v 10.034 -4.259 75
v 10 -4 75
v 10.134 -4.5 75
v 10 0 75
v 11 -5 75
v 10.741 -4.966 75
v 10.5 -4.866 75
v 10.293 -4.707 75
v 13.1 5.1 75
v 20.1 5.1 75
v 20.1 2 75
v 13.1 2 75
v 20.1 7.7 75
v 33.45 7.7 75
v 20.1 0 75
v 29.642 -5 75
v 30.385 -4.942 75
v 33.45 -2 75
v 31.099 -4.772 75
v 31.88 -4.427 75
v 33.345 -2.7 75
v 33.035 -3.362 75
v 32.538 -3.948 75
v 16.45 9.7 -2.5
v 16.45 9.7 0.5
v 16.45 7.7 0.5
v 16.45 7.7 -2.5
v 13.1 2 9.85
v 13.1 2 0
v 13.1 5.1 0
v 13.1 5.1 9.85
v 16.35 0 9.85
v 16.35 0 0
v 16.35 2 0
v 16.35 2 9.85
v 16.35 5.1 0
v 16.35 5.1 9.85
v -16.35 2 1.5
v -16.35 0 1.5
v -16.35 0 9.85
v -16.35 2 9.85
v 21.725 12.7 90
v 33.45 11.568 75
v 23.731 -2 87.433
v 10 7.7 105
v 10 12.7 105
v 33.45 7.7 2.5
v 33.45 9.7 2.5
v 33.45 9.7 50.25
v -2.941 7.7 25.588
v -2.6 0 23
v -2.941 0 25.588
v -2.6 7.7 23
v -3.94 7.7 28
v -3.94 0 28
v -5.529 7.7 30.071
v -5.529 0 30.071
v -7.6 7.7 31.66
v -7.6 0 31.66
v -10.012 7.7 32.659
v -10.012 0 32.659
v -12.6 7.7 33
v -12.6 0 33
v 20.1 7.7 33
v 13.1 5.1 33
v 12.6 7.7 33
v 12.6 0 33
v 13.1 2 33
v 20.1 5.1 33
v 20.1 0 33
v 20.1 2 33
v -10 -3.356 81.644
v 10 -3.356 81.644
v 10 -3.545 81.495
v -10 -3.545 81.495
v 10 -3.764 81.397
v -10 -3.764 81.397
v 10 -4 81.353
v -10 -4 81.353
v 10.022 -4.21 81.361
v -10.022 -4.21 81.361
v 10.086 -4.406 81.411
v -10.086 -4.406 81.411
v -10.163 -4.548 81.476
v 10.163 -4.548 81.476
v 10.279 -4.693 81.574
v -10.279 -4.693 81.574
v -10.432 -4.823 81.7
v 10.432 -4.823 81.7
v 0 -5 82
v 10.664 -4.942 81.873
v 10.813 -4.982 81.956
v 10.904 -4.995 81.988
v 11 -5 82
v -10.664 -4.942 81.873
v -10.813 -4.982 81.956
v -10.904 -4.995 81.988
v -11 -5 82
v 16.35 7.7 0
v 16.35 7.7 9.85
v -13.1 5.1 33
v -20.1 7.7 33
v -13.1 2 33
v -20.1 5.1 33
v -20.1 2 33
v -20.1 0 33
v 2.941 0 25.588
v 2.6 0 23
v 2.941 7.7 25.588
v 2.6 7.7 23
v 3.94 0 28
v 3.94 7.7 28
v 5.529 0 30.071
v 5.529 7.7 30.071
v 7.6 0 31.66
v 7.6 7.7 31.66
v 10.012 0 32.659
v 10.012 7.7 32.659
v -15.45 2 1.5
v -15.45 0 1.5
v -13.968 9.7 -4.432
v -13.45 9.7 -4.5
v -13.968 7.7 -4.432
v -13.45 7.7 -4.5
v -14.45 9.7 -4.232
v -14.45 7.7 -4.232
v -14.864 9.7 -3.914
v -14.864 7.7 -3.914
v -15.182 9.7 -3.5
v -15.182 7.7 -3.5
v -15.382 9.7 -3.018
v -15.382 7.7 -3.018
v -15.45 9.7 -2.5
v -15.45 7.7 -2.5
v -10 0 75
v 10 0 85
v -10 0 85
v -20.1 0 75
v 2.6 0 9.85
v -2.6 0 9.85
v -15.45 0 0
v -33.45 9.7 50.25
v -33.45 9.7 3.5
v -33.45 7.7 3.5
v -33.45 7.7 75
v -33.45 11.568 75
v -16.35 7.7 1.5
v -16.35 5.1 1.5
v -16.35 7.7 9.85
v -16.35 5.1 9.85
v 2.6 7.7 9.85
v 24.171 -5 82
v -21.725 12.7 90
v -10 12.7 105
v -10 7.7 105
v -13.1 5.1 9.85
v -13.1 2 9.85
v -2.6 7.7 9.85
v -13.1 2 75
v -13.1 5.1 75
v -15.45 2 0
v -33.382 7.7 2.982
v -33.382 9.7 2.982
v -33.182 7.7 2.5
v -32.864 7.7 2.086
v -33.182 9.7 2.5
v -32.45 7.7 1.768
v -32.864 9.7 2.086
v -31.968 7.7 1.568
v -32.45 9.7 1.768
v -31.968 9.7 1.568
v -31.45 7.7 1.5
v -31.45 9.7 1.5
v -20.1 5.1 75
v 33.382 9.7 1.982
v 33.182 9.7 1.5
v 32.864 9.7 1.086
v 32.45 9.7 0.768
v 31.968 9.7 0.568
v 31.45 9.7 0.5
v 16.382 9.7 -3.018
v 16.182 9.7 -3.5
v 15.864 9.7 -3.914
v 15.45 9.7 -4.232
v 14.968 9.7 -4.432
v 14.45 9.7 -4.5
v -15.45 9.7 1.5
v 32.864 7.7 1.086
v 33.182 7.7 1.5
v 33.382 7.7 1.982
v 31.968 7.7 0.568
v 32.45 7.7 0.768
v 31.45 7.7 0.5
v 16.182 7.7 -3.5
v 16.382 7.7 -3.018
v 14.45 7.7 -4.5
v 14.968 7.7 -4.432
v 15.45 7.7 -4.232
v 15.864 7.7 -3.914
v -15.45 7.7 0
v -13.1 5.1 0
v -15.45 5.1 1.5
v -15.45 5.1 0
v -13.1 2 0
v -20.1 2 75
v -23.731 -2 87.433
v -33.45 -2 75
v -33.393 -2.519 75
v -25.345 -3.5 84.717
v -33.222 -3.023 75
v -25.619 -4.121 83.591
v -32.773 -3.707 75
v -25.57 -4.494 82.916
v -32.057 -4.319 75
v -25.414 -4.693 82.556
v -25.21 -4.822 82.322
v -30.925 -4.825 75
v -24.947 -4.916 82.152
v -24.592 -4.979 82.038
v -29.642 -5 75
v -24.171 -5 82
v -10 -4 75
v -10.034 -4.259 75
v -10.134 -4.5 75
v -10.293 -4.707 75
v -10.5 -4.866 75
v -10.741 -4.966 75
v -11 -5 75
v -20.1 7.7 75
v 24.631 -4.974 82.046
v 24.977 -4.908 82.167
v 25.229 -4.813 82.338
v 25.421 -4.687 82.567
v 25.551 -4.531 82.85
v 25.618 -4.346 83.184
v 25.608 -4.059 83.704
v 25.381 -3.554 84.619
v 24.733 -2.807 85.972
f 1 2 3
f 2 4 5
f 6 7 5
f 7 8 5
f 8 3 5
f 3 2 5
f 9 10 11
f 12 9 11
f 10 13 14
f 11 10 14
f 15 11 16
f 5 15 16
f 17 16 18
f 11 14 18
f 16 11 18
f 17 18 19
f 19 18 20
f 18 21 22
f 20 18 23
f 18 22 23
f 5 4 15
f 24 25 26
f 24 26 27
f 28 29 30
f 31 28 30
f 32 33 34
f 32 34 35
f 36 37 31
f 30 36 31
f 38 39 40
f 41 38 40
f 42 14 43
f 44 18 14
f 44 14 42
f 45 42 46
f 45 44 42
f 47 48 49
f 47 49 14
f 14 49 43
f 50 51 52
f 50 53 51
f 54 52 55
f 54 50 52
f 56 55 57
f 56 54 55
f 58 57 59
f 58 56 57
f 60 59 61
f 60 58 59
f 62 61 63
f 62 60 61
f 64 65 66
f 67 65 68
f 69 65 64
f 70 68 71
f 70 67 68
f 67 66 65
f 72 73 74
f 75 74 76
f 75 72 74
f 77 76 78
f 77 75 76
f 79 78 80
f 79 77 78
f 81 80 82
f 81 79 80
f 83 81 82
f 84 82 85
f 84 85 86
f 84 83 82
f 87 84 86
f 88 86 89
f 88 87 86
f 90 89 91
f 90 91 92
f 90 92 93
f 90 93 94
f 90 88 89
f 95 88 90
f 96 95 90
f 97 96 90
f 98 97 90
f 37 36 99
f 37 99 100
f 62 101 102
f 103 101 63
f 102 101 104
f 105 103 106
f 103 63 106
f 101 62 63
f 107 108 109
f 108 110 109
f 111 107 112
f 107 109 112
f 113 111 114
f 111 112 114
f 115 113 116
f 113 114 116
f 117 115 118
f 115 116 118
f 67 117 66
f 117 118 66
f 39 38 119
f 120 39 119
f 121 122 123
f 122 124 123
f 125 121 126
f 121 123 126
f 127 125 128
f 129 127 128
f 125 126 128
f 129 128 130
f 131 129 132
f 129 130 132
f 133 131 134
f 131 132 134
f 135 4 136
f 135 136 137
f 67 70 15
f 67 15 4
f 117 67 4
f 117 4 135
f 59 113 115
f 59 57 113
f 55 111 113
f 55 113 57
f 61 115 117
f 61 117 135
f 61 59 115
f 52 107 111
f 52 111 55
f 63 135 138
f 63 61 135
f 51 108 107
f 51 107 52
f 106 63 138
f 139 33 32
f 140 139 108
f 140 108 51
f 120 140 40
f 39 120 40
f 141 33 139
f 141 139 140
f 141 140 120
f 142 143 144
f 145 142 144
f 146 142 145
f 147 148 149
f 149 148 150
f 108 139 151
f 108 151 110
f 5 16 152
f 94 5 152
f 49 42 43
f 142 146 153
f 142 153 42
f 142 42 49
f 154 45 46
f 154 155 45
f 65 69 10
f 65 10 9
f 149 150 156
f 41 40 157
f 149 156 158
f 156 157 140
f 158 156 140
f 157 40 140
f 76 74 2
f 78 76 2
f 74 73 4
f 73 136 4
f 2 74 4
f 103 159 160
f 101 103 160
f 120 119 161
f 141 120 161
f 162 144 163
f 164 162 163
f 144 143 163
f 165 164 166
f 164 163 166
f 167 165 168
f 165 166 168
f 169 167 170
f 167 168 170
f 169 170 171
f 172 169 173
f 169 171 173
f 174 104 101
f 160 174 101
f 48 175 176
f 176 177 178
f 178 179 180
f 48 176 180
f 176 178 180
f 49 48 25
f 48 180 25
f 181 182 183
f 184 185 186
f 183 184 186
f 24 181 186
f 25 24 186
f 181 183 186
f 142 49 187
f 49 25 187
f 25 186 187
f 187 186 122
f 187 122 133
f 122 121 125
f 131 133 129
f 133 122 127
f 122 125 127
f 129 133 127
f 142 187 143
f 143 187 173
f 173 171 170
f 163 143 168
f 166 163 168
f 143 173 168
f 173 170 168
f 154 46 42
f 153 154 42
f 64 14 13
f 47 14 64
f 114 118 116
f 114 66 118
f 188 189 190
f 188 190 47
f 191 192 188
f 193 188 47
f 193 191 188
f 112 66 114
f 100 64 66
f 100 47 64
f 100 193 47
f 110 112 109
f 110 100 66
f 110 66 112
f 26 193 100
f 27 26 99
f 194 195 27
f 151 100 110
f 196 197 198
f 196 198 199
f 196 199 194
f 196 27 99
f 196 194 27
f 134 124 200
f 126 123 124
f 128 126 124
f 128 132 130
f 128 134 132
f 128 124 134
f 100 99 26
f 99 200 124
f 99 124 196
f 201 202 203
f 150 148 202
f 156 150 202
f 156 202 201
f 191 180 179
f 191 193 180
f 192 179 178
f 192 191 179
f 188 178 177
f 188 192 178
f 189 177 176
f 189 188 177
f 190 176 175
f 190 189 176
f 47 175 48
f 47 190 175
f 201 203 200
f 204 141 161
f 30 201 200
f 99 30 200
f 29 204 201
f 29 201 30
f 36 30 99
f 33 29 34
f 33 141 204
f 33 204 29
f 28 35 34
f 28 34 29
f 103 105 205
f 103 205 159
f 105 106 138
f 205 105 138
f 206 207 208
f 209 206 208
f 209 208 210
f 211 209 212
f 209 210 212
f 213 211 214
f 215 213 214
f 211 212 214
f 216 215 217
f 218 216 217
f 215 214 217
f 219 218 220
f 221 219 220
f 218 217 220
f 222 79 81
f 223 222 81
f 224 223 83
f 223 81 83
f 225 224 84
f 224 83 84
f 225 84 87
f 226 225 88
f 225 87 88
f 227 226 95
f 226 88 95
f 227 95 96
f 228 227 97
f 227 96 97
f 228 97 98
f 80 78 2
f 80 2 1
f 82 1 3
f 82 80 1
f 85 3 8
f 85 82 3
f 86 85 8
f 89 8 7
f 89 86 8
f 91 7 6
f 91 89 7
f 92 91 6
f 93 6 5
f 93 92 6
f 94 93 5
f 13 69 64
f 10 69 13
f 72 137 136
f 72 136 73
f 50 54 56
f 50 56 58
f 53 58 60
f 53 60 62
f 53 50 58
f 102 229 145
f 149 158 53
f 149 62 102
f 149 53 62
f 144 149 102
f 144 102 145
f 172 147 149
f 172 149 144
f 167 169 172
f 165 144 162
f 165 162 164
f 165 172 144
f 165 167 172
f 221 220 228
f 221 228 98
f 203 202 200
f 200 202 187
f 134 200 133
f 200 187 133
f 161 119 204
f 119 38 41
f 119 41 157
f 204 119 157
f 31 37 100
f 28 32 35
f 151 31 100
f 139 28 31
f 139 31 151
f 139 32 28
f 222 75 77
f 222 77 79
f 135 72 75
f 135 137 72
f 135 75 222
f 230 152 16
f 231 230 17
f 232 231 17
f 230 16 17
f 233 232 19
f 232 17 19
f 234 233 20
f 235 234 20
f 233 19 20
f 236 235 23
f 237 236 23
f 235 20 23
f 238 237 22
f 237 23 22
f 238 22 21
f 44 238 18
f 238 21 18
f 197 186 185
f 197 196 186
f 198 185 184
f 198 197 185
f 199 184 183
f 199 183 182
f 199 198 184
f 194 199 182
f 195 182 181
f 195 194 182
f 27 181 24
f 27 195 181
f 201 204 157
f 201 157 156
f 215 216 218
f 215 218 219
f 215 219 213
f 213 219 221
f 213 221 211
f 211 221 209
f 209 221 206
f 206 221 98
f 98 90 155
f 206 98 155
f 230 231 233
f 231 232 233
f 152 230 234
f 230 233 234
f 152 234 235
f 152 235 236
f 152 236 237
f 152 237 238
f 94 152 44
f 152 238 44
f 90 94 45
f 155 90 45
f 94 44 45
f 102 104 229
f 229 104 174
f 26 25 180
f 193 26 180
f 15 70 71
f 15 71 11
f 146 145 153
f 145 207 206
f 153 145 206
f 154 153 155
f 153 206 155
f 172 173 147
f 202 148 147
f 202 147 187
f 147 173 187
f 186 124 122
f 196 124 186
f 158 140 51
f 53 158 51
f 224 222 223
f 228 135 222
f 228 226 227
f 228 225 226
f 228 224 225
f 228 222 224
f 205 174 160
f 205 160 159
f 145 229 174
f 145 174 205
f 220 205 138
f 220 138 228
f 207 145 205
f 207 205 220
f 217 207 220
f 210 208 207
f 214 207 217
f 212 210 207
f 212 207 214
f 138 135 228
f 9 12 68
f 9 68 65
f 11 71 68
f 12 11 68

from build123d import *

# Parameters (mm, degrees)
BOSS_EXTRUDE1_DEPTH     = 7.7
SKETCH2_W               = 7
SKETCH2_H               = 3.1
CUT_EXTRUDE1_DEPTH      = 79.027559234
FILLET1_R               = 10
BOSS_EXTRUDE2_DEPTH     = 2
BOSS_EXTRUDE3_DEPTH     = 33.45
BOSS_EXTRUDE4_REACH     = 112.929
CUT_EXTRUDE2_DEPTH      = 111.928772192
CUT_EXTRUDE2_DEPTH_BACK = 111.928772192
CUT_EXTRUDE3_DEPTH      = 10
FILLET3_R               = 1
FILLET5_R               = 3
CUT_EXTRUDE4_REACH      = 113.176
SKETCH8_W               = 17
SKETCH8_H               = 5
SKETCH8_W_2             = 19
SKETCH8_H_2             = 7
FILLET6_R               = 2
FILLET7_R               = 2


with BuildPart() as part:
    # Sketch1 → Boss-Extrude1 (new body)
    with BuildSketch(Plane(origin=(0, 0, 0), x_dir=(1, 0, 0), z_dir=(0, 1, 0))):
        Polygon((0, 0), (-16.35, 0), (-16.35, -9.85), (-2.6, -9.85), (-2.6, -33), (-20.1, -33), (-20.1, -75), (0, -75), align=None)
    extrude(amount=BOSS_EXTRUDE1_DEPTH)

    # Sketch2 → Cut-Extrude1 (cut, through all)
    with BuildSketch(Plane.XY.offset(75)):
        with Locations((-16.6, 3.55)):
            Rectangle(SKETCH2_W, SKETCH2_H)
    extrude(amount=-CUT_EXTRUDE1_DEPTH, mode=Mode.SUBTRACT)

    # Fillet1
    fillet1_edges = [part.edges().sort_by_distance(p)[0] for p in [
        (-2.6, 3.85, 33),
    ]]
    fillet(fillet1_edges, radius=FILLET1_R)

    # Sketch3 → Boss-Extrude2 (add)
    with BuildSketch(Plane(origin=(0, 7.7, 0), x_dir=(1, 0, 0), z_dir=(0, 1, 0))):
        Polygon((0, 4.5), (-33.45, 4.5), (-33.45, -75), (-10, -105), (0, -105), align=None)
    extrude(amount=BOSS_EXTRUDE2_DEPTH)

    # Sketch4 → Boss-Extrude3 (add)
    with BuildSketch(Plane(origin=(0, 0, 0), x_dir=(0, 0, -1), z_dir=(1, 0, 0))):
        Polygon((-105, 9.7), (-105, 12.7), (-90, 12.7), (-50.25, 9.7), align=None)
    extrude(amount=-BOSS_EXTRUDE3_DEPTH)

    # Boss-Extrude4: up to this face of the body (flat: up to its plane)
    boss_extrude4_end = Plane(part.part.faces().sort_by_distance((0, 5.848980441, 46.191947566))[0])
    # Sketch5 → Boss-Extrude4 (add, up to the picked face)
    with BuildSketch(Plane.ZY.offset(33.45), mode=Mode.PRIVATE) as boss_extrude4_sk1:
        Polygon((75, 7.7), (75, -5), (82, -5), (105, 7.7), align=None)
    boss_extrude4_tool1 = split(extrude(boss_extrude4_sk1.sketch, amount=-BOSS_EXTRUDE4_REACH, mode=Mode.PRIVATE), bisect_by=boss_extrude4_end, keep=Keep.BOTH, mode=Mode.PRIVATE)
    add(boss_extrude4_tool1.solids().sort_by(Axis((-33.45, 2.665766, 85.441441), (1, 0, 0)))[0])

    # Sketch6 → Cut-Extrude2 (cut, two sides: drawn at the far end of the back side and taken through both)
    with BuildSketch(Plane(origin=(0, 7.7, 0), x_dir=(1, 0, 0), z_dir=(0, 1, 0)).offset(-CUT_EXTRUDE2_DEPTH_BACK)):
        Polygon((-33.45, -75), (-10, -105), (-33.45, -105), align=None)
    extrude(amount=CUT_EXTRUDE2_DEPTH + CUT_EXTRUDE2_DEPTH_BACK, mode=Mode.SUBTRACT)

    # Sketch7 → Cut-Extrude3 (cut)
    with BuildSketch(Plane(origin=(0, 0, 0), x_dir=(0, 0, -1), z_dir=(1, 0, 0))):
        Polygon((-75, 0), (-85, 0), (-80, -5), (-75, -5), align=None)
    extrude(amount=-CUT_EXTRUDE3_DEPTH, mode=Mode.SUBTRACT)

    # Fillet3
    # the kernel refuses this fillet: 1 mm, written as the material it takes off along each edge
    with BuildSketch(Plane(origin=(5.810983209, -5, 80), x_dir=(0, 0, 1), z_dir=(-1, 0, 0))) as fillet3_piece_1:
        with BuildLine():
            CenterArc((2.350701034, 0.936487472), FILLET3_R, 135, 114.469800521)
            Line((1.643594253, 1.643594253), (1.629452117, 1.657736389))
            Line((1.629452117, 1.657736389), (-0.014142136, 0.014142136))
            Line((-0.014142136, 0.014142136), (0, -0.02))
            ThreePointArc((0, -0.02), (1, -0.02), (1.992985979, -0.018729749))
            Line((1.992985979, -0.018729749), (2, 0))
        make_face()
    extrude(amount=15.810983209, mode=Mode.SUBTRACT)
    with BuildSketch(Plane(origin=(-10, -5, 82.5), x_dir=(-1, 0, 0), z_dir=(0, 0, -1))) as fillet3_piece_2_section:
        with BuildLine():
            CenterArc((FILLET3_R, FILLET3_R), FILLET3_R, 180, 90)
            Line((0, FILLET3_R), (-FILLET3_R * 0.02, FILLET3_R))
            Line((-FILLET3_R * 0.02, FILLET3_R), (-FILLET3_R * 0.02, -FILLET3_R * 0.02))
            Line((-FILLET3_R * 0.02, -FILLET3_R * 0.02), (FILLET3_R, -FILLET3_R * 0.02))
            Line((FILLET3_R, -FILLET3_R * 0.02), (FILLET3_R, 0))
        make_face()
    fillet3_piece_2 = extrude(amount=10, mode=Mode.PRIVATE)
    fillet3_piece_2 = split(fillet3_piece_2, bisect_by=Plane(origin=(-10.222841489, -6.700692184, 78.299307816), z_dir=(0, 0.7071067811865466, -0.7071067811865485)), keep=Keep.TOP, mode=Mode.PRIVATE)
    add(fillet3_piece_2, mode=Mode.SUBTRACT)
    with BuildSketch(Plane(origin=(5.810983209, -5, 80), x_dir=(0, 0, 1), z_dir=(-1, 0, 0))) as fillet3_piece_3a_section:
        with BuildLine():
            CenterArc((2.350701034, 0.936487472), FILLET3_R, 135, 114.469800521)
            Line((1.643594253, 1.643594253), (1.629452117, 1.657736389))
            Line((1.629452117, 1.657736389), (-0.014142136, 0.014142136))
            Line((-0.014142136, 0.014142136), (0, -0.02))
            ThreePointArc((0, -0.02), (1, -0.02), (1.992985979, -0.018729749))
            Line((1.992985979, -0.018729749), (2, 0))
        make_face()
    fillet3_piece_3a = extrude(amount=21.621966417, mode=Mode.PRIVATE)
    fillet3_piece_3a = split(fillet3_piece_3a, bisect_by=Plane(origin=(-10, -4.567151235, 80.996776665), z_dir=(-1, 0, 0)), keep=Keep.TOP, mode=Mode.PRIVATE)
    with BuildSketch(Plane(origin=(-10, -5, 82.5), x_dir=(-1, 0, 0), z_dir=(0, 0, -1))) as fillet3_piece_3b_section:
        with BuildLine():
            CenterArc((FILLET3_R, FILLET3_R), FILLET3_R, 180, 90)
            Line((0, FILLET3_R), (-FILLET3_R * 0.02, FILLET3_R))
            Line((-FILLET3_R * 0.02, FILLET3_R), (-FILLET3_R * 0.02, -FILLET3_R * 0.02))
            Line((-FILLET3_R * 0.02, -FILLET3_R * 0.02), (FILLET3_R, -FILLET3_R * 0.02))
            Line((FILLET3_R, -FILLET3_R * 0.02), (FILLET3_R, 0))
        make_face()
    fillet3_piece_3b = extrude(amount=10, mode=Mode.PRIVATE)
    fillet3_piece_3b = split(fillet3_piece_3b, bisect_by=Plane(origin=(-10.238471404, -4.220535034, 80.779464966), z_dir=(0, -0.7071067811865466, 0.7071067811865485)), keep=Keep.TOP, mode=Mode.PRIVATE)
    fillet3_piece_3 = fillet3_piece_3a & fillet3_piece_3b
    add(fillet3_piece_3, mode=Mode.SUBTRACT)

    # Mirror1: part across plane


with BuildPart() as part_1:
    add(part.part)
    add(part.part.mirror(Plane(origin=(0, 7.7, 75), x_dir=(0, 0, 1), z_dir=(-1, 0, 0))))

    # Fillet5
    # the kernel refuses this fillet: 3 mm, written as the material it takes off along each edge
    with BuildSketch(Plane(origin=(-38.068859068, -5, 69.091011854), x_dir=(0, 1, 0), z_dir=(0.6158478756904763, 0, 0.7878650861711843)), Plane(origin=(38.068859068, -5, 69.091011854), x_dir=(-0.7878650861711843, 0, -0.6158478756904764), z_dir=(-0.6158478756904763, 0, 0.7878650861711843))) as fillet5_piece_1:
        with BuildLine():
            CenterArc((FILLET5_R, -FILLET5_R), FILLET5_R, 90, 90)
            Line((0, -FILLET5_R), (0, 0))
            Line((0, 0), (FILLET5_R, 0))
        make_face()
    extrude(amount=23.884769896, mode=Mode.SUBTRACT)

    # Cut-Extrude4: up to this face of the body (flat: up to its plane)
    cut_extrude4_end = Plane(part_1.part.faces().sort_by_distance((0, 0, 47.459676899))[0])
    # Sketch8 → Cut-Extrude4 (cut, up to the picked face)
    with BuildSketch(Plane(origin=(0, 9.7, 0), x_dir=(1, 0, 0), z_dir=(0, 1, 0)), mode=Mode.PRIVATE) as cut_extrude4_sk1:
        with Locations((24.95, 2)):
            Rectangle(SKETCH8_W, SKETCH8_H)
    cut_extrude4_tool1 = split(extrude(cut_extrude4_sk1.sketch, amount=-CUT_EXTRUDE4_REACH, mode=Mode.PRIVATE), bisect_by=cut_extrude4_end, keep=Keep.BOTH, mode=Mode.PRIVATE)
    # Sketch8 → Cut-Extrude4 (cut, up to the picked face)
    with BuildSketch(Plane(origin=(0, 9.7, 0), x_dir=(1, 0, 0), z_dir=(0, 1, 0)), mode=Mode.PRIVATE) as cut_extrude4_sk2:
        with Locations((-24.95, 2)):
            Rectangle(SKETCH8_W_2, SKETCH8_H_2)
    cut_extrude4_tool2 = split(extrude(cut_extrude4_sk2.sketch, amount=-CUT_EXTRUDE4_REACH, mode=Mode.PRIVATE), bisect_by=cut_extrude4_end, keep=Keep.BOTH, mode=Mode.PRIVATE)
    add(cut_extrude4_tool1.solids().sort_by(Axis((24.95, 9.7, -2), (0, -1, 0)))[0], mode=Mode.SUBTRACT)
    add(cut_extrude4_tool2.solids().sort_by(Axis((-24.95, 9.7, -2), (0, -1, 0)))[0], mode=Mode.SUBTRACT)

    # Fillet6
    fillet6_edges = [part_1.edges().sort_by_distance(p)[0] for p in [
        (-15.45, 8.7, -4.5),
        (-33.45, 8.7, 1.5),
    ]]
    fillet(fillet6_edges, radius=FILLET6_R)

    # Fillet7
    fillet7_edges = [part_1.edges().sort_by_distance(p)[0] for p in [
        (33.45, 8.7, 0.5),
        (16.45, 8.7, -4.5),
    ]]
    fillet(fillet7_edges, radius=FILLET7_R)


solid = part_1.part
